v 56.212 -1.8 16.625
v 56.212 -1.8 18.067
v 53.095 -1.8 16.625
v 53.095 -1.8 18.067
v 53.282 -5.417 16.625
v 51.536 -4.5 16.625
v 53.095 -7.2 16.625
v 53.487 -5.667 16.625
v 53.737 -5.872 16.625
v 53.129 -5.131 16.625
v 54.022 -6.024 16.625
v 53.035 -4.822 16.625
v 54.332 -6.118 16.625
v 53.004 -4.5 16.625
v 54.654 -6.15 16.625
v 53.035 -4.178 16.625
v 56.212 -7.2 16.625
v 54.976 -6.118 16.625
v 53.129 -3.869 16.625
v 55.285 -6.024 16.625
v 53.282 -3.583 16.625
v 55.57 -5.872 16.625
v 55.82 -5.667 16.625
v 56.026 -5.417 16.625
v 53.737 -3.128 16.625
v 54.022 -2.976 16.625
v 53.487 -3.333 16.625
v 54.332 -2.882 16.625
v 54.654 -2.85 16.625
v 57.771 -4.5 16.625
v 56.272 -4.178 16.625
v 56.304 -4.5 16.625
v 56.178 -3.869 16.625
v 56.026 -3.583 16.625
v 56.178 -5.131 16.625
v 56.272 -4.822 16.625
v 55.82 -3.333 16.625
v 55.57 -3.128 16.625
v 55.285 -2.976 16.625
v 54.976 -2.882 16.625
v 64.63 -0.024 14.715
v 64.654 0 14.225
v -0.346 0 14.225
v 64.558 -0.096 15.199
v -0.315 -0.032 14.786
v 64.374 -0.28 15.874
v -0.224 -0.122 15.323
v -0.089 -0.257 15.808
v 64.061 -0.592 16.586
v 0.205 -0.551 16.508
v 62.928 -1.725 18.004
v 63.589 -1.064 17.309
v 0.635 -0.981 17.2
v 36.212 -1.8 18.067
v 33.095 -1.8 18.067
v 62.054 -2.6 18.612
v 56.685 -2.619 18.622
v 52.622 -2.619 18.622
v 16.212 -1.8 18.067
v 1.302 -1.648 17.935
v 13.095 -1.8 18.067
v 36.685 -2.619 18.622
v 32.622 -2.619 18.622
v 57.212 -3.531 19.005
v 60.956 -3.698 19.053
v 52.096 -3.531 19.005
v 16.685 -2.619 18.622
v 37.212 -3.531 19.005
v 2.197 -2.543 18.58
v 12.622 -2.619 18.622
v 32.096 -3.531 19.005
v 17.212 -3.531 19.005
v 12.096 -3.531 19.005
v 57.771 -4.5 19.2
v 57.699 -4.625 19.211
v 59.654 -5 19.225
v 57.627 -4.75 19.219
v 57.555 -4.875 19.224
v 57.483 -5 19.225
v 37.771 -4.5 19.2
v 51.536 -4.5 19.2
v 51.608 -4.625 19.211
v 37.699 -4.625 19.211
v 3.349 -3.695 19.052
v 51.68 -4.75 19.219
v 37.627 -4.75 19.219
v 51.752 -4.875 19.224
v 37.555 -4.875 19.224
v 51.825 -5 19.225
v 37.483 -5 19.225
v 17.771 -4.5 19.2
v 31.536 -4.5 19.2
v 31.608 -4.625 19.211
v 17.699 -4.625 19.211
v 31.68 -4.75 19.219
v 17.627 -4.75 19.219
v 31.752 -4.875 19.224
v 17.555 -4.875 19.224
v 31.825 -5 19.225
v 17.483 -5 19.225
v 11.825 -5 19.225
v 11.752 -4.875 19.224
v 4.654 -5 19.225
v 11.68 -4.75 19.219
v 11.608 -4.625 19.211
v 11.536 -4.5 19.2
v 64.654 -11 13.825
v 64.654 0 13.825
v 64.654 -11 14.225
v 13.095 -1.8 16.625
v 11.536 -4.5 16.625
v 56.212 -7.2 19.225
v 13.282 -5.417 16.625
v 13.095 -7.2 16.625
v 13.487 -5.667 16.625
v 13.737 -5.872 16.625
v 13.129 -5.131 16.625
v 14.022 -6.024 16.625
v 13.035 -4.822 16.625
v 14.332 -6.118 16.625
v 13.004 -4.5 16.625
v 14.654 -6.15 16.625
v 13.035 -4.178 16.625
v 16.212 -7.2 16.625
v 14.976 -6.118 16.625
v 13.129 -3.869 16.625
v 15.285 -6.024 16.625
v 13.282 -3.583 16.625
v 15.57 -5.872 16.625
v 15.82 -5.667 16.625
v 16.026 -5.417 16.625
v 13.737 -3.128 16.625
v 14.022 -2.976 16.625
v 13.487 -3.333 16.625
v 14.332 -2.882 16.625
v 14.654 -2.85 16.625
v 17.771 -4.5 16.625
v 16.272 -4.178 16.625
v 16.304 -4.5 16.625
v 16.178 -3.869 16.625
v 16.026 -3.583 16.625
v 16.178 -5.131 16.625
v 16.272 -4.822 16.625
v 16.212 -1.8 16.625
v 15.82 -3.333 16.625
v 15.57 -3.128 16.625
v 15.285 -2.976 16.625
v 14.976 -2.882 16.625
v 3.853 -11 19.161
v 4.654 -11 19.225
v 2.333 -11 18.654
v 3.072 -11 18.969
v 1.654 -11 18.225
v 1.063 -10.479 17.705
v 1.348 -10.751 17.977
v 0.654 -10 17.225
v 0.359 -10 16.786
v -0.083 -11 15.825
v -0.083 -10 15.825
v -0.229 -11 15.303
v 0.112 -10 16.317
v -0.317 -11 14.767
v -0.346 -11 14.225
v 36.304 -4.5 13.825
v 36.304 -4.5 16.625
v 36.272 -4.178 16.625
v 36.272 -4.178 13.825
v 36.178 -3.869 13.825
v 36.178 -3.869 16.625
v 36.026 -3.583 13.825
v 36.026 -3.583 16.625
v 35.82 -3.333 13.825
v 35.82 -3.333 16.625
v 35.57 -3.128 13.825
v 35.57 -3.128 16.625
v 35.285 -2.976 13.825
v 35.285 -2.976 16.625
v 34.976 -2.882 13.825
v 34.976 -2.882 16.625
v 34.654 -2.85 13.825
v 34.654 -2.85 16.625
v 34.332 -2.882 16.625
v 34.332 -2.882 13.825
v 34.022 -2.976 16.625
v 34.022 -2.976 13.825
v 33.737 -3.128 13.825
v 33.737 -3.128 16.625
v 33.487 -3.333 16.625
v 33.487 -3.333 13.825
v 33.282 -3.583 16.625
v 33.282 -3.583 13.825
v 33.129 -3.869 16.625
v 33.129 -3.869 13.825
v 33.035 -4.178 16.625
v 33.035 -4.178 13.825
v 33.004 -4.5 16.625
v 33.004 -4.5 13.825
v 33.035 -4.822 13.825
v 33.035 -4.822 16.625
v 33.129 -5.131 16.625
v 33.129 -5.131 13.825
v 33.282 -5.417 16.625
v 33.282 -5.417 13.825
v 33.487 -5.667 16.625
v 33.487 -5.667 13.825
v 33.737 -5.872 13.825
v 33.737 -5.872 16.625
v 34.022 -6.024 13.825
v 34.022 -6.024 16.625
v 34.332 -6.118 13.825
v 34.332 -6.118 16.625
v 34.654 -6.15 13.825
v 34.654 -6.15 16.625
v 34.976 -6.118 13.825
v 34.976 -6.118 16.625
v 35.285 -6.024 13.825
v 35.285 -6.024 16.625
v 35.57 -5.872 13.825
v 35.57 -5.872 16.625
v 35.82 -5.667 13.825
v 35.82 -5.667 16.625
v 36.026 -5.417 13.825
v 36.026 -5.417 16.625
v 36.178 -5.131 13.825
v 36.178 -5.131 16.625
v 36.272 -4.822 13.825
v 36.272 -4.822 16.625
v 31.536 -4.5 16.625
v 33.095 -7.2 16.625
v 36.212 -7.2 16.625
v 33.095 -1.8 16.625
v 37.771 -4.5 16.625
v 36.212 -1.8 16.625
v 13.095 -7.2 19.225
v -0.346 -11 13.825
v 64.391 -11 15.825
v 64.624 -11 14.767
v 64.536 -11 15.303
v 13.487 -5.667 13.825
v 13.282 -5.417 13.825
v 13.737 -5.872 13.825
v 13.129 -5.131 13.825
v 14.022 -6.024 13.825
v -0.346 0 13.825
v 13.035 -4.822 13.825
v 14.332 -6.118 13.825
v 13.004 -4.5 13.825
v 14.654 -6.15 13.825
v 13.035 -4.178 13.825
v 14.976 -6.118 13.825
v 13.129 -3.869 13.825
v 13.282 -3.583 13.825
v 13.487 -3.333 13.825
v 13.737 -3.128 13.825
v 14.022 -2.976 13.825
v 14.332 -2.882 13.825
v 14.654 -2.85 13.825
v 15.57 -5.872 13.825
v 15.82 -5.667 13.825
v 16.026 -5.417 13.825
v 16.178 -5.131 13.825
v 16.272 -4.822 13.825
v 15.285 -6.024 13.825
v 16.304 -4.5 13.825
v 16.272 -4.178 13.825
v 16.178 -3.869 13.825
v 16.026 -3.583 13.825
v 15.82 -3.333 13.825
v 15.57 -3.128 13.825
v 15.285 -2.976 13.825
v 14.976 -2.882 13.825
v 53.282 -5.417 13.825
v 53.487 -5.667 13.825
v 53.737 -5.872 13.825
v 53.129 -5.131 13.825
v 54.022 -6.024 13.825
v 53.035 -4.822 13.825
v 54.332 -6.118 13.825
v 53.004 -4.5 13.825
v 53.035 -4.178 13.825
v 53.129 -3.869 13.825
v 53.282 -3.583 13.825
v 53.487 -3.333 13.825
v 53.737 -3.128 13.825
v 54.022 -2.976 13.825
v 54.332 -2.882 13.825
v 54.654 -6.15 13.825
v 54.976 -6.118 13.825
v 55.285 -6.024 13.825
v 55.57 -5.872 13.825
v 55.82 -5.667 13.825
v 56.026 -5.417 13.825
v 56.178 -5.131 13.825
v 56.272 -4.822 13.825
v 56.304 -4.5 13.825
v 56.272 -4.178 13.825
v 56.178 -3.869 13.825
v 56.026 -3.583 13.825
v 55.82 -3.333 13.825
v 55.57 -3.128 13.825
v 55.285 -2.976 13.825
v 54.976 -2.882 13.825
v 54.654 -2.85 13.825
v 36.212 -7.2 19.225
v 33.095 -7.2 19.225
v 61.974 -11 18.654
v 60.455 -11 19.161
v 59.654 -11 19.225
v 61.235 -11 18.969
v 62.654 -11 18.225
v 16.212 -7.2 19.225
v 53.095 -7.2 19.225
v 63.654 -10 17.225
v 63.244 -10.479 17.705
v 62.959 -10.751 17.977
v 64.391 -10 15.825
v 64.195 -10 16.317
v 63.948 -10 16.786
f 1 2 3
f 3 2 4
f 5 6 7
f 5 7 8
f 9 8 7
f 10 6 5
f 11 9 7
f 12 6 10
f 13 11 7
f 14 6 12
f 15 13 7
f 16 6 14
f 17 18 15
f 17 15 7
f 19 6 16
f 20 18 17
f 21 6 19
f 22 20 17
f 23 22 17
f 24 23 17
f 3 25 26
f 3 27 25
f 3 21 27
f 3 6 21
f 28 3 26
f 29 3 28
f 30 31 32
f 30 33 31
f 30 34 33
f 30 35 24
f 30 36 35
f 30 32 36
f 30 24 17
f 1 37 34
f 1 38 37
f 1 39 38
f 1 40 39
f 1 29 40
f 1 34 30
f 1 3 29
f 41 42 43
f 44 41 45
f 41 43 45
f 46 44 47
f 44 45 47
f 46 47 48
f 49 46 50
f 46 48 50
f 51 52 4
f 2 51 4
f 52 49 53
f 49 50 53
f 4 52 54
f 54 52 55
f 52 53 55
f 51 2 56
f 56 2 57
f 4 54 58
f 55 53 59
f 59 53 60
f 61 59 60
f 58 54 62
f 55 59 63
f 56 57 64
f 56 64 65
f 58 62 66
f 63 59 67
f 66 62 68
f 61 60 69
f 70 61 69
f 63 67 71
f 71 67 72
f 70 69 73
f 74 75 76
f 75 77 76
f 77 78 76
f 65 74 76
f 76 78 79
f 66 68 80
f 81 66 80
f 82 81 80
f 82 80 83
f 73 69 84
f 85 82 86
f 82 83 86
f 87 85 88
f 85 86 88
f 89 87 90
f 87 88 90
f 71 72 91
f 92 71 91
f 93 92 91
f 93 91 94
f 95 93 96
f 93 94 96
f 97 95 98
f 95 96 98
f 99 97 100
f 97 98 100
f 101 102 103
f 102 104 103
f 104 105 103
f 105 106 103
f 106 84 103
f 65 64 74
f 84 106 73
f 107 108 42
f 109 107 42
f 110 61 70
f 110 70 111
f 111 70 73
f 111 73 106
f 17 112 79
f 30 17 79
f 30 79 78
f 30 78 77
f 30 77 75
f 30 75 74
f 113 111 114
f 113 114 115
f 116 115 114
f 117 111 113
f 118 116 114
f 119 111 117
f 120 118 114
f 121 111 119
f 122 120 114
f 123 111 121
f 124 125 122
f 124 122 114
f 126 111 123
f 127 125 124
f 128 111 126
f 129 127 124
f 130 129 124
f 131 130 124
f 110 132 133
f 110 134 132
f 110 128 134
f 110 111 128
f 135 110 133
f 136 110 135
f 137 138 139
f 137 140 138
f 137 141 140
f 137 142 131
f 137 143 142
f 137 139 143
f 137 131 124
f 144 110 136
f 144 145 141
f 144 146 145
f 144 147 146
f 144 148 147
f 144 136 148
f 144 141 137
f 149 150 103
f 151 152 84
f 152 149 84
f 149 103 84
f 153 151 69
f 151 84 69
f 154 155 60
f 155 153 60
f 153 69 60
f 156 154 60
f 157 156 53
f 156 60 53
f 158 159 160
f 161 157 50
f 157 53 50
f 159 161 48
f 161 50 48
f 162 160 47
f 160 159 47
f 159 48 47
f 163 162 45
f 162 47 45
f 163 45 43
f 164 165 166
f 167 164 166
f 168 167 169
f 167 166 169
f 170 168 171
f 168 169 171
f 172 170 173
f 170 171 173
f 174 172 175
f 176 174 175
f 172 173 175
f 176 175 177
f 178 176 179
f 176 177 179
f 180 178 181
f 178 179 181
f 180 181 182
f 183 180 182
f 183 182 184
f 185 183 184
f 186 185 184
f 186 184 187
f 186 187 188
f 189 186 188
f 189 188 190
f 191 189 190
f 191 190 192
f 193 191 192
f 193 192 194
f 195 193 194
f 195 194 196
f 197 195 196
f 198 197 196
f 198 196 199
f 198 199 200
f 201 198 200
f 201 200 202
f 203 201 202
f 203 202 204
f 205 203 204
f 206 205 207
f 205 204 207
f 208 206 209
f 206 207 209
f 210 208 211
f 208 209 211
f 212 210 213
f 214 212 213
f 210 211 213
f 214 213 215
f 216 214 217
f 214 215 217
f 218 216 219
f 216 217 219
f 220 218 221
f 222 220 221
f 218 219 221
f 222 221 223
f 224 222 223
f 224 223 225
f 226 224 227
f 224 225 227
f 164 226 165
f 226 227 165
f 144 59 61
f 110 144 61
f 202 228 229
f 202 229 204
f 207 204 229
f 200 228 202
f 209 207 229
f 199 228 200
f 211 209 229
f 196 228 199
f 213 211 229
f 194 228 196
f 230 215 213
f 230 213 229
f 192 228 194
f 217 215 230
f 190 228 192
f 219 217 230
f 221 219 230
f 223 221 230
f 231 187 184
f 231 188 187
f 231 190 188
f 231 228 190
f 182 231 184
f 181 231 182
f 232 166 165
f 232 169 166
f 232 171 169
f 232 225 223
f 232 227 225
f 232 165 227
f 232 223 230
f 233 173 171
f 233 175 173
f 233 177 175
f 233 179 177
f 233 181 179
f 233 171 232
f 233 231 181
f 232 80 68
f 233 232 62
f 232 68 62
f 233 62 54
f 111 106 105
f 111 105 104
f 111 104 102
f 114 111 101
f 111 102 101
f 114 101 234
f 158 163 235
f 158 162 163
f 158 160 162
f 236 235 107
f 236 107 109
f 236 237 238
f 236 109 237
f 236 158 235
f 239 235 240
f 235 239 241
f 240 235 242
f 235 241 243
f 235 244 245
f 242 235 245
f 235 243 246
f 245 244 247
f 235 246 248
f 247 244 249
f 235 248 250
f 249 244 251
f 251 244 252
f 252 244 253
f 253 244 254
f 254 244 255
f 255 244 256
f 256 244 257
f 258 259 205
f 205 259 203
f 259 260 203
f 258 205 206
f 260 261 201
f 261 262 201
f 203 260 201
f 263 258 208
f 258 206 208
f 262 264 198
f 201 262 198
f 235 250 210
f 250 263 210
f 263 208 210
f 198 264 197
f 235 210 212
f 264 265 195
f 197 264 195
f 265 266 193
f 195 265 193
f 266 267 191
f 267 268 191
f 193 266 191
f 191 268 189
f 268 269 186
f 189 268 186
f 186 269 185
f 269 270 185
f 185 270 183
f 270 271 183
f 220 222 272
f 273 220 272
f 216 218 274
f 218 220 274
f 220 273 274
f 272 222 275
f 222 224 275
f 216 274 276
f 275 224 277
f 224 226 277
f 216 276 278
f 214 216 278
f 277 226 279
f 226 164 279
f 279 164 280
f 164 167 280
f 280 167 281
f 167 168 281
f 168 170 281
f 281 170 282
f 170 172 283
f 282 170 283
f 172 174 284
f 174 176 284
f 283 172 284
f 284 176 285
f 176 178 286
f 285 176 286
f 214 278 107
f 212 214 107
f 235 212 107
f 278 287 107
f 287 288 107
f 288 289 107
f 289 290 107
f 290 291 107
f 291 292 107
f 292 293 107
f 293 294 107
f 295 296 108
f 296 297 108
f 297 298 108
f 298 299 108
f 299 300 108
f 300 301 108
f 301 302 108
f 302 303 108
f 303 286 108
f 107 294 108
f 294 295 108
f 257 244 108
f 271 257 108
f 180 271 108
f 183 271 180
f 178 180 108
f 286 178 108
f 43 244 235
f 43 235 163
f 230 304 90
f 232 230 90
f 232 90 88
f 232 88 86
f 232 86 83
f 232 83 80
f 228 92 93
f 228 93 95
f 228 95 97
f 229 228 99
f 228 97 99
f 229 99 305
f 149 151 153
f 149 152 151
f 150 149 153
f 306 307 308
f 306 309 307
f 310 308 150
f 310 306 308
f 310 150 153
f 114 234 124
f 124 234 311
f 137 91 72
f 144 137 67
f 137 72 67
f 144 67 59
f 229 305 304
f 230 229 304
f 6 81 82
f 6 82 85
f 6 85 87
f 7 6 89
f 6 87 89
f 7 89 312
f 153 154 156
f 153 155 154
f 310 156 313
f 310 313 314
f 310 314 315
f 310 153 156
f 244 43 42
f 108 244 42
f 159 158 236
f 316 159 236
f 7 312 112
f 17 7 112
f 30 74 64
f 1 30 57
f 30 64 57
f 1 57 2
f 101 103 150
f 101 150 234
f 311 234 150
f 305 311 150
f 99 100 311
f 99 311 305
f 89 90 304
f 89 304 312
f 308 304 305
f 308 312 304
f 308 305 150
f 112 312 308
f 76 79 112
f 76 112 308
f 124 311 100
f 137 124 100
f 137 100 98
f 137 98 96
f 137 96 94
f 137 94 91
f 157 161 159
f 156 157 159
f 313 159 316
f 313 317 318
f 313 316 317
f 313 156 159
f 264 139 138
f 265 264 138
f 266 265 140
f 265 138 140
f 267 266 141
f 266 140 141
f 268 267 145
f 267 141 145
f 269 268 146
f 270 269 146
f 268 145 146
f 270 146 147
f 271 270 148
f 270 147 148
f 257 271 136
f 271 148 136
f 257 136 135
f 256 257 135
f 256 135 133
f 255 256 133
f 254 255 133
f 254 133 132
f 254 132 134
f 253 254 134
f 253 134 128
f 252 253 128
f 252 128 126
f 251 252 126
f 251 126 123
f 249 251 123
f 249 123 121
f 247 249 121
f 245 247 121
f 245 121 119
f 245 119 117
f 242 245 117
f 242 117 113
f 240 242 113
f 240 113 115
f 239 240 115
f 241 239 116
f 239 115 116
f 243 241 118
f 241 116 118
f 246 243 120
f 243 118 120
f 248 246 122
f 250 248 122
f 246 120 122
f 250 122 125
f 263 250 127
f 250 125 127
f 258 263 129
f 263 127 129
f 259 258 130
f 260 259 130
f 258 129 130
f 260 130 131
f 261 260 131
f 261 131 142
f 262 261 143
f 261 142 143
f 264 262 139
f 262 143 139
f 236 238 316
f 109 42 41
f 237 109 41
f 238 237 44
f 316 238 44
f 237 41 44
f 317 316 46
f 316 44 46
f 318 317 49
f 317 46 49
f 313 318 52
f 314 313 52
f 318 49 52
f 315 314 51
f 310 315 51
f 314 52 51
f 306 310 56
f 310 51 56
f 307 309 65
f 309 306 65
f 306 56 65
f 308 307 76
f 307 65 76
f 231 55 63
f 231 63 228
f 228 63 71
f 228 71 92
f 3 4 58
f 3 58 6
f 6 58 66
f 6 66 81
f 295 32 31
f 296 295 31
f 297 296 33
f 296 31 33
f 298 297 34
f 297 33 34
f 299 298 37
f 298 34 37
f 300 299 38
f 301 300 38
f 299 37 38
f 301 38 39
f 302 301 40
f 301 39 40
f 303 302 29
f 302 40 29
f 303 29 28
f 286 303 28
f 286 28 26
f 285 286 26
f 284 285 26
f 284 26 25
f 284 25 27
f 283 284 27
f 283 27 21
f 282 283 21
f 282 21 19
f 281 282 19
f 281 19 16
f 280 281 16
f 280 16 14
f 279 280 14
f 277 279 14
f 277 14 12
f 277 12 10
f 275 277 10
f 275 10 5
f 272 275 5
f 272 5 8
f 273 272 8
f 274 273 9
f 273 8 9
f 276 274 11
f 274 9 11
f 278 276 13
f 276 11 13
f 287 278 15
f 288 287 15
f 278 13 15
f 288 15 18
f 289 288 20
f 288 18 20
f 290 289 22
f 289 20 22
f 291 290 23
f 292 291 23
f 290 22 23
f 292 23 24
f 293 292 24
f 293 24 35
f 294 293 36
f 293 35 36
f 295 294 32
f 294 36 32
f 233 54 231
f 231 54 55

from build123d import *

# Parameters (mm, degrees)
F0_W        = 65
F0_H        = 5.4
F1_DEPTH    = 11
F2_W        = 65
F2_H        = 1.4
F3_DEPTH    = 1
F4_R        = 1.65
F5_DEPTH    = 25
F7_DEPTH    = 2.6
F8_T1_DEPTH = 36
F8_T3_DEPTH = 90
F9_SIZE     = 0.99999


# Not quite as in the source:
# - a fillet or chamfer that OpenCascade refuses, or shapes differently, is made with other operations: its cross-section is extruded or revolved along the edge and cut away or added
# - a fillet or chamfer is up to 0.001 mm smaller than in the source, because OpenCascade refuses the exact size


with BuildPart() as f1:
    # F0 (on Front) → F1 (new body)
    with BuildSketch(Plane.XZ):
        with Locations((32.1536201239, 16.5253020123)):
            Rectangle(F0_W, F0_H)
    extrude(amount=F1_DEPTH)

    # F2 (on face) → F3 (cut)
    with BuildSketch(Plane.XZ.offset(11)):
        with Locations((32.1536201239, 16.5253020123)):
            Rectangle(F2_W, F2_H)
    extrude(amount=-F3_DEPTH, mode=Mode.SUBTRACT)

    # F4 (on face) → F5 (cut)
    with BuildSketch(Plane.XY.offset(19.2253020123)):
        with Locations((14.6536201239, -4.5)):
            Circle(F4_R)
        with Locations((34.6536201239, -4.5)):
            Circle(F4_R)
        with Locations((54.6536201239, -4.5)):
            Circle(F4_R)
    extrude(amount=-F5_DEPTH, mode=Mode.SUBTRACT)

    # F6 (on face) → F7 (cut)
    with BuildSketch(Plane.XY.offset(19.2253020123)):
        Polygon((13.0947743971, -7.2), (16.2124658507, -7.2), (17.7713115775, -4.5), (16.2124658507, -1.8), (13.0947743971, -1.8), (11.5359286702, -4.5), align=None)
        Polygon((33.0947743971, -7.2), (36.2124658507, -7.2), (37.7713115775, -4.5), (36.2124658507, -1.8), (33.0947743971, -1.8), (31.5359286702, -4.5), align=None)
        Polygon((53.0947743971, -7.2), (56.2124658507, -7.2), (57.7713115775, -4.5), (56.2124658507, -1.8), (53.0947743971, -1.8), (51.5359286702, -4.5), align=None)
    extrude(amount=-F7_DEPTH, mode=Mode.SUBTRACT)

    # F8: fillet of radius 5 on 3 edges, made by hand

    # F8_s2 → F8_t1 (cut)
    with BuildSketch(Plane.XZ.offset(-12.5)):
        with BuildLine():
            ThreePointArc((64.6536201239, 14.2253020123), (63.1891540298, 17.7608359182), (59.6536201239, 19.2253020123))
            Line((59.6536201239, 19.2253020123), (64.6536201239, 19.2253020123))
            Line((64.6536201239, 19.2253020123), (64.6536201239, 14.2253020123))
        make_face()
        with BuildLine():
            ThreePointArc((4.6536201239, 19.2253020123), (1.1180862179, 17.7608359182), (-0.3463798761, 14.2253020123))
            Line((-0.3463798761, 14.2253020123), (-0.3463798761, 19.2253020123))
            Line((-0.3463798761, 19.2253020123), (4.6536201239, 19.2253020123))
        make_face()
    extrude(amount=F8_T1_DEPTH, mode=Mode.SUBTRACT)

    # F8_s4 → F8_t3 (cut)
    with BuildSketch(Plane.YZ.offset(-12.8463798761)):
        with BuildLine():
            ThreePointArc((0, 14.2253020123), (-1.4644660941, 17.7608359182), (-5, 19.2253020123))
            Line((-5, 19.2253020123), (0, 19.2253020123))
            Line((0, 19.2253020123), (0, 14.2253020123))
        make_face()
    extrude(amount=F8_T3_DEPTH, mode=Mode.SUBTRACT)

    # F9 (size 1 in the source; OpenCascade refuses exactly that, so slightly less here)
    f9_edges = [f1.edges().sort_by_distance(p)[0] for p in [
        (32.15362, -11, 17.225302),
    ]]
    chamfer(f9_edges, length=F9_SIZE)


solid = f1.part
